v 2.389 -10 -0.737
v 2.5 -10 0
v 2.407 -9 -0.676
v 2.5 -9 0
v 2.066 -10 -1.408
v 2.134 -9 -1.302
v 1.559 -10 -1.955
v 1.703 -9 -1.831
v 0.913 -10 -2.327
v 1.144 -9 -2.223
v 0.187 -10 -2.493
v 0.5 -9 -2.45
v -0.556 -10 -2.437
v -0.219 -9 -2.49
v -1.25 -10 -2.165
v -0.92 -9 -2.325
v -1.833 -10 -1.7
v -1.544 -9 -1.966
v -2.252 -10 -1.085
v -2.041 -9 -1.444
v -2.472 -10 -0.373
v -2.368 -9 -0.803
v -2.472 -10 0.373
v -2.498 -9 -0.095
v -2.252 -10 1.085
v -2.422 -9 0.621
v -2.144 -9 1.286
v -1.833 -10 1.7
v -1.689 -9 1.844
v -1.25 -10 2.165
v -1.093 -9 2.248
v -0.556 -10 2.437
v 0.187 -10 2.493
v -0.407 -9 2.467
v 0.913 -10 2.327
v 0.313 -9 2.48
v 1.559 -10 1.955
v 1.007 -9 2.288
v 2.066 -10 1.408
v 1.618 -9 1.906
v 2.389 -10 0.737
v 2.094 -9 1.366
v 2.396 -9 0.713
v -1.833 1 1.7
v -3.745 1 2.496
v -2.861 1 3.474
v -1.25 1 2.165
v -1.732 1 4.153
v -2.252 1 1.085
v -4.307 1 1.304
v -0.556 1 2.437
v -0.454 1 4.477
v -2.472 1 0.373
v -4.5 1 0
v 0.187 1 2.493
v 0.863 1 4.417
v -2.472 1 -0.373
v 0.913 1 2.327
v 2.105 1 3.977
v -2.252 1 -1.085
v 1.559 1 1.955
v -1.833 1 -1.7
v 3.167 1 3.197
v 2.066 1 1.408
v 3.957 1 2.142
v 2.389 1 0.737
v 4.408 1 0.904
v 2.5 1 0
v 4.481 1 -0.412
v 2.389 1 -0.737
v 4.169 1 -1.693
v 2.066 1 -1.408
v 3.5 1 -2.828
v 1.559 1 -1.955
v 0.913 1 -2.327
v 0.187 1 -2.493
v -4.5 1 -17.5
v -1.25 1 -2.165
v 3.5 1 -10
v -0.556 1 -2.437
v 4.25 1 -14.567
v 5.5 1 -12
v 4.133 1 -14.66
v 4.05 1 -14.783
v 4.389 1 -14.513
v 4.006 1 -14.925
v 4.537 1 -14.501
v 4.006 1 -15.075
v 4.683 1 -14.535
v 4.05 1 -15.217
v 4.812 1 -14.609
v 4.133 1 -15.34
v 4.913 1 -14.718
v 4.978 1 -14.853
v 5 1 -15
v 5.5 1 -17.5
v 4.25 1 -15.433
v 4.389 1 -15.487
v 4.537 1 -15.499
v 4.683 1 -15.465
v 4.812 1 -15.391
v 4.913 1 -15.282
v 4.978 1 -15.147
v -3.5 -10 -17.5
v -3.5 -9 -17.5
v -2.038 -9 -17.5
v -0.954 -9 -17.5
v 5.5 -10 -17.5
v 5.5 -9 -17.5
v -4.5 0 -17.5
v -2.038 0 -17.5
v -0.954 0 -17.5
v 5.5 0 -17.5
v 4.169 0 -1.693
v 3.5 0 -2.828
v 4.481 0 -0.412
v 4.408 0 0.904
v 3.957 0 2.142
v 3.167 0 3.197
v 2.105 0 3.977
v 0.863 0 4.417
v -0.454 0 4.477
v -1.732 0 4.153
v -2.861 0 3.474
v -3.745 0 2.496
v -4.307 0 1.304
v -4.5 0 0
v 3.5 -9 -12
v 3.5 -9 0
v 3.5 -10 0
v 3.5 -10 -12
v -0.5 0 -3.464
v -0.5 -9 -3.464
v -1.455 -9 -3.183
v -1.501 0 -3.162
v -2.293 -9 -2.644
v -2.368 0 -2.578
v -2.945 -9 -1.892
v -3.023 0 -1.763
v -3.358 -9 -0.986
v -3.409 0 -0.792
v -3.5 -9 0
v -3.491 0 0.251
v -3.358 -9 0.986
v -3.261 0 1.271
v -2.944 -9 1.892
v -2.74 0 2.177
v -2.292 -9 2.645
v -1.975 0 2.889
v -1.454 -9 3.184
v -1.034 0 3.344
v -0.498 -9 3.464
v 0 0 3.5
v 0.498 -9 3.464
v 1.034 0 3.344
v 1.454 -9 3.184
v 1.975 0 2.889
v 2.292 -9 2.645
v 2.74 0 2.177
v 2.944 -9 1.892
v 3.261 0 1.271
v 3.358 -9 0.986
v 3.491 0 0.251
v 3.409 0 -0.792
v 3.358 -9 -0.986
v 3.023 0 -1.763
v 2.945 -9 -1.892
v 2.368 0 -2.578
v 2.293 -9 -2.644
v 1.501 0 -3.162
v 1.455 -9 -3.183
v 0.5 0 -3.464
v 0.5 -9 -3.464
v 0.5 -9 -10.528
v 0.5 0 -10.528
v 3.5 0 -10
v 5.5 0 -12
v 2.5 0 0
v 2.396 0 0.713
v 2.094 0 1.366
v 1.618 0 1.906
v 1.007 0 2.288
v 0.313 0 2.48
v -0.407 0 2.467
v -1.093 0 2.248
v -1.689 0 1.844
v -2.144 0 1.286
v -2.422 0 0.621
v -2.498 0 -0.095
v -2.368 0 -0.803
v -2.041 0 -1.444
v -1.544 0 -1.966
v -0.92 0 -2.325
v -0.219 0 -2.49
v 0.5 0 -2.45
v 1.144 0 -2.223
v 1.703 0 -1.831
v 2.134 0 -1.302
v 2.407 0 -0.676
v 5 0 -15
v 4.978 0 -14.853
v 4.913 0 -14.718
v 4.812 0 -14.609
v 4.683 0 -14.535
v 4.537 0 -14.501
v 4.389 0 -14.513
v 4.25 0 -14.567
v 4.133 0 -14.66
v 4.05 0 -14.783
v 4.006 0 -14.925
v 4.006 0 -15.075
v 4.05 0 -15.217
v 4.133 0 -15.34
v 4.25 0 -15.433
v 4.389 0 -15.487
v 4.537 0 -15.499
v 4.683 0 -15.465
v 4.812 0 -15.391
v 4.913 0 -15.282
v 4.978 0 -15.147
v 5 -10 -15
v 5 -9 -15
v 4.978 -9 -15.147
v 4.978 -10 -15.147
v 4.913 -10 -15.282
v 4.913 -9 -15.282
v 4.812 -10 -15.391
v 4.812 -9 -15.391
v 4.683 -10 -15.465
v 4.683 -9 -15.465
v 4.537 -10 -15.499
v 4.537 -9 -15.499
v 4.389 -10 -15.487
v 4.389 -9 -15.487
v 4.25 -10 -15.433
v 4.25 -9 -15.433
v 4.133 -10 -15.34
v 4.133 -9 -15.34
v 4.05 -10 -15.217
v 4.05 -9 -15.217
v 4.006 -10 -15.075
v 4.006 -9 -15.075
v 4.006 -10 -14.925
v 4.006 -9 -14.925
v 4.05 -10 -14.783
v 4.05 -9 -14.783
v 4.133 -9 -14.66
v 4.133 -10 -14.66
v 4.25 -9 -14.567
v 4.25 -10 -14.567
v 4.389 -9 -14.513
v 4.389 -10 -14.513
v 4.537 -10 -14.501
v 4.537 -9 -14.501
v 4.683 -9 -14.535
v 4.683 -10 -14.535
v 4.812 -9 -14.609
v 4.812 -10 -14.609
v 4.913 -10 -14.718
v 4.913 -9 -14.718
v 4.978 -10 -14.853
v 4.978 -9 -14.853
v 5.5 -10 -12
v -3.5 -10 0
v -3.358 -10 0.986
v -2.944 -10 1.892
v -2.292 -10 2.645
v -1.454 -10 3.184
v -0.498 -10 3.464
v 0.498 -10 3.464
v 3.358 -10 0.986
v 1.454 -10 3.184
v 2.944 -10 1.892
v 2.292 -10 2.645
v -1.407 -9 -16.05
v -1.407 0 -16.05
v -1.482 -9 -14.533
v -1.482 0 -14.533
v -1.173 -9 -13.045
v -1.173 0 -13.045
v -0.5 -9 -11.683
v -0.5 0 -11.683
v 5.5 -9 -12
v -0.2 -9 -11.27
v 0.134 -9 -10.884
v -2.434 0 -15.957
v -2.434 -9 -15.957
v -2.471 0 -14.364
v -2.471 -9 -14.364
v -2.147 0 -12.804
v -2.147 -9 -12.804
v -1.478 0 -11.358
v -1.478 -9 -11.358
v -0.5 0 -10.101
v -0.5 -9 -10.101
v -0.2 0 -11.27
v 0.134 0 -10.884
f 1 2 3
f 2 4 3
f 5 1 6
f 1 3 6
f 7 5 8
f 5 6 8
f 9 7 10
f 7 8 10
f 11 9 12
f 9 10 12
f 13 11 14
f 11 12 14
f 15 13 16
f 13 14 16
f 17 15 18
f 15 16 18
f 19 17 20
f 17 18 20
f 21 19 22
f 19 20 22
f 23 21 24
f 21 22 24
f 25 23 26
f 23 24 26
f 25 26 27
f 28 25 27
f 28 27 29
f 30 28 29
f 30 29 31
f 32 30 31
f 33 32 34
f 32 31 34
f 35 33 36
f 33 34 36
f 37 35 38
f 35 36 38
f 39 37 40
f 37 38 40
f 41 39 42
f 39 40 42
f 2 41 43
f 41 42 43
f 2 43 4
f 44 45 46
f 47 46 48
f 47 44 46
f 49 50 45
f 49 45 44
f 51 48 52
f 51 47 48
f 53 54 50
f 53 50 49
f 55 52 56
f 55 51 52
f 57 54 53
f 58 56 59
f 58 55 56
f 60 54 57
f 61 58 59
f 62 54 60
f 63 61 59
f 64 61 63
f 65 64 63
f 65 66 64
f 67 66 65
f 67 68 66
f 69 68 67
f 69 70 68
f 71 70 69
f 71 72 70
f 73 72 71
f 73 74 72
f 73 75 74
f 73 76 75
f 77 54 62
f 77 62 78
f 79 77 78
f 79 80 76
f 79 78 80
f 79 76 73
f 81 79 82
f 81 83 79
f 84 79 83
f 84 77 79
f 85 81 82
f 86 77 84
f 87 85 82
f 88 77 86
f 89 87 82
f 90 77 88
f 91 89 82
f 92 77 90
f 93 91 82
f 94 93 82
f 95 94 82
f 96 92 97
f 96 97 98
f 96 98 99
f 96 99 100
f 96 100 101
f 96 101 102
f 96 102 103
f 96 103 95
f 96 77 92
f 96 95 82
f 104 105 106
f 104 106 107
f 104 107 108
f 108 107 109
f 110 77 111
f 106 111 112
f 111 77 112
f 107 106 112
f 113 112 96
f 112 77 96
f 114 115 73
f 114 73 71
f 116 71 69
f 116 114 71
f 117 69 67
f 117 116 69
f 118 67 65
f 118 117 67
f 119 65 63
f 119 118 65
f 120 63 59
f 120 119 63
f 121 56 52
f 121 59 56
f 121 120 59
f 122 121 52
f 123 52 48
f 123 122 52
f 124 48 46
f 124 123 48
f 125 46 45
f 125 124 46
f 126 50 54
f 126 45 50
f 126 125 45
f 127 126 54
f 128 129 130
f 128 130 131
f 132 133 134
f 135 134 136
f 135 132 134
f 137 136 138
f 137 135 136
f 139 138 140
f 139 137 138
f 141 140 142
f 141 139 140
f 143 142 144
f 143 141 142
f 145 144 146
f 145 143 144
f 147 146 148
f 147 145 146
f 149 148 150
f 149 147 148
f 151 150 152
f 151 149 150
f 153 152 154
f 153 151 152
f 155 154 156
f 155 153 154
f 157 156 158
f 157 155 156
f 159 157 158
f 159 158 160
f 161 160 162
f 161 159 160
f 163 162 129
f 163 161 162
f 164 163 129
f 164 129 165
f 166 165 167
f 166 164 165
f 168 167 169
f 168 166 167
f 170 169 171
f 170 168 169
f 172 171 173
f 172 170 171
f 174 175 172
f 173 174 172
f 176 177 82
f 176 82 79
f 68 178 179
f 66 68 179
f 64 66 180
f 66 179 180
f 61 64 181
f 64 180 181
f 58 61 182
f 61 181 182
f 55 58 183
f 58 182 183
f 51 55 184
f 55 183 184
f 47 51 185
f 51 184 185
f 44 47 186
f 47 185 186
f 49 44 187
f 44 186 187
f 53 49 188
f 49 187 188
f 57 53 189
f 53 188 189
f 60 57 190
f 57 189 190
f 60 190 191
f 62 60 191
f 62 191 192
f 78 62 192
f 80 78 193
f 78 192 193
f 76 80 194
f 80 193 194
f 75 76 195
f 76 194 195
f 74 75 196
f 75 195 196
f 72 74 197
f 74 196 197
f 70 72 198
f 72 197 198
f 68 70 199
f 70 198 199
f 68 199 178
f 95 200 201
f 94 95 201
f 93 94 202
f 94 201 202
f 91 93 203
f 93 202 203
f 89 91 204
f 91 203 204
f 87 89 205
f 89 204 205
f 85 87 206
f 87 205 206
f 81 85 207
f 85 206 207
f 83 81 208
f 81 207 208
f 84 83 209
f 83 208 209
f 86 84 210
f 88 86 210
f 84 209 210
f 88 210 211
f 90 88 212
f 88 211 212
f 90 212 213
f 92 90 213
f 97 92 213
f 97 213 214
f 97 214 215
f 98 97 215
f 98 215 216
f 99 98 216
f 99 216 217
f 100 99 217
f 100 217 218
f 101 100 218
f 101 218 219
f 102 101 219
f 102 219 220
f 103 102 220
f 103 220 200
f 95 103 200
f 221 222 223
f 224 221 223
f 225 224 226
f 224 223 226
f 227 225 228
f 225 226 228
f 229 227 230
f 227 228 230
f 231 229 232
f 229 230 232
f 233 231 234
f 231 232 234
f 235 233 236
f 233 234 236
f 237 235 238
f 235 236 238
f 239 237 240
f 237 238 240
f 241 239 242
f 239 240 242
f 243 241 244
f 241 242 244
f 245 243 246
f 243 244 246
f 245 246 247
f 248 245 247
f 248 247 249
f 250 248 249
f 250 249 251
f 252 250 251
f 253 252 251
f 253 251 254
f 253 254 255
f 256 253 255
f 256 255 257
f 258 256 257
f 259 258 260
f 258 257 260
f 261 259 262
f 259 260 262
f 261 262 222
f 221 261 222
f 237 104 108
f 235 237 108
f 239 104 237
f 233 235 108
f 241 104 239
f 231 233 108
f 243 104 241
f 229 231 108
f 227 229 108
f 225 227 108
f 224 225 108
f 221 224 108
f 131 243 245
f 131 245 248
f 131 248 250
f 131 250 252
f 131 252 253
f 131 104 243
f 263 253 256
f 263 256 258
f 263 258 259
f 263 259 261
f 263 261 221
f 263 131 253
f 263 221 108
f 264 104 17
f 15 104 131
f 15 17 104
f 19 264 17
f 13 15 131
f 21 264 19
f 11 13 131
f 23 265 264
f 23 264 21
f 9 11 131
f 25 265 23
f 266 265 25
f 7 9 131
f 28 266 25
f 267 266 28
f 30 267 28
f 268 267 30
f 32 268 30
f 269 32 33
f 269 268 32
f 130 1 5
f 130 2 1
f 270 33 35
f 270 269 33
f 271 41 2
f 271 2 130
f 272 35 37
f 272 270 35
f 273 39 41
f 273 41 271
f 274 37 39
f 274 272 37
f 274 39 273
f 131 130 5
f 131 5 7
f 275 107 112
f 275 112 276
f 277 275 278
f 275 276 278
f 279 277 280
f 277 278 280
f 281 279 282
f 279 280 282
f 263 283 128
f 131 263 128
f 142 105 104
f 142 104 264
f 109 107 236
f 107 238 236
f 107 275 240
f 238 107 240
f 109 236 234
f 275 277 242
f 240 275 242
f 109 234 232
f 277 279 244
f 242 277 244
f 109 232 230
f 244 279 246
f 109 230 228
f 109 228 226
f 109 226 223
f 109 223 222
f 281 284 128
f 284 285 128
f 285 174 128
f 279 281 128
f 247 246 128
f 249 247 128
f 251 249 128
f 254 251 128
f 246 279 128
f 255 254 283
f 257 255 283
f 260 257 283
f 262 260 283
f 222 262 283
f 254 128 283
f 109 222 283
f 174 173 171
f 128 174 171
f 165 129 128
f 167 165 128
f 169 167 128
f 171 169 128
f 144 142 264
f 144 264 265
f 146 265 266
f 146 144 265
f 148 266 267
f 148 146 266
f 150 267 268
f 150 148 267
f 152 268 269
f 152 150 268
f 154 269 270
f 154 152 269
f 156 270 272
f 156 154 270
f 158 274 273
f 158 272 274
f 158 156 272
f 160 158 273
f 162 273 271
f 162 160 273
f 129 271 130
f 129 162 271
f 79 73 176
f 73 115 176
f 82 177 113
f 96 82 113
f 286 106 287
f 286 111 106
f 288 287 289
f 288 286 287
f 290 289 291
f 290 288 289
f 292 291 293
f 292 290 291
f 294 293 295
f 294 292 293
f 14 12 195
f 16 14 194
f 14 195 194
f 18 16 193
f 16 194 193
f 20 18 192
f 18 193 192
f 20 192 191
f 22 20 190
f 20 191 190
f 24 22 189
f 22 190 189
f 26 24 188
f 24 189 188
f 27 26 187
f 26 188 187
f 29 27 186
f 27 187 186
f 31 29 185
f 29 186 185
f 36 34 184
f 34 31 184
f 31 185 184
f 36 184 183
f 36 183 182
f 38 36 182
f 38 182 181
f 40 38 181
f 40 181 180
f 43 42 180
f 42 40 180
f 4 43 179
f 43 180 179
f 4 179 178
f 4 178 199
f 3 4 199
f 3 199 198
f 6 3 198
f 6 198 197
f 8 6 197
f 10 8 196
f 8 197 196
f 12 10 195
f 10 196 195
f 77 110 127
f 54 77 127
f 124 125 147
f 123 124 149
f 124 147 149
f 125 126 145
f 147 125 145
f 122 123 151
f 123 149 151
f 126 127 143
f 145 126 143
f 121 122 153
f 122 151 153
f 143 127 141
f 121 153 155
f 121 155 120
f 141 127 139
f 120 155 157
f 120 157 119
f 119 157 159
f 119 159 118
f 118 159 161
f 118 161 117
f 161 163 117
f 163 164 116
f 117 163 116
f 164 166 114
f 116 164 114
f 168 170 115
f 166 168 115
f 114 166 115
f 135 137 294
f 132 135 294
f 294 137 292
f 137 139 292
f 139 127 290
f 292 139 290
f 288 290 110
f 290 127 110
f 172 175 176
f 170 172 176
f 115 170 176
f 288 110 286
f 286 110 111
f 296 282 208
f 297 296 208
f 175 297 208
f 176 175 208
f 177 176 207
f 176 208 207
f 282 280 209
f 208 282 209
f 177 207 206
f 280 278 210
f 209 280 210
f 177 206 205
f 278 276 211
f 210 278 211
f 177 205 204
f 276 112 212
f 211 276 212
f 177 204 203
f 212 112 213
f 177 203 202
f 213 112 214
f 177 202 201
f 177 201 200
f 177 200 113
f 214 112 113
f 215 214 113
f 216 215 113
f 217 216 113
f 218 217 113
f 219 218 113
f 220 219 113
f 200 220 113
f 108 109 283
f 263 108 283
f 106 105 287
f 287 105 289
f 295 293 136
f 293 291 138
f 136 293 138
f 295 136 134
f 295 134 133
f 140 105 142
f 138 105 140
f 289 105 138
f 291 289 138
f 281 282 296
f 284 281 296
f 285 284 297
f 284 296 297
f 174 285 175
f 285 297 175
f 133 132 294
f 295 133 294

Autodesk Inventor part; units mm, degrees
ref_plane "YZ Plane" through (0, 0, 0) normal (1, 0, 0) x (0, 1, 0)
ref_plane "XZ Plane" through (0, 0, 0) normal (0, 1, 0) x (-1, 0, 0)
ref_plane "XY Plane" through (0, 0, 0) normal (0, 0, 1) x (1, 0, 0)
sketch "Esquisse1" plane through (0, 0, 0) normal (0, 1, 0) x (-1, 0, 0)
  arc A0 (-0.5, -2.4495) -> (0.5, -2.4495) centre (0, 0) ccw
  arc A1 (0.5, -3.4641) -> (-0.5, -3.4641) centre (0, 0) ccw
  arc A2 (0.5, -11.6834) -> (-0.5, -10.5279) centre (-4.5, -15) ccw
  arc A3 (0.5, -10.101) -> (-0.5, -9.2554) centre (-4.5, -15) ccw
  line L0 (-11.5, 3.5) -> (3.5, 3.5)
  line L1 (3.5, 3.5) -> (3.5, -17.5)
  line L2 (3.5, -17.5) -> (2.0383, -17.5)
  line L3 (-11.5, -17.5) -> (-11.5, 3.5)
  line L4 (-0.5, 0) -> (0.5, 0)
  line L5 (0.5, 0) -> (0.5, -2.4495)
  line L6 (0.5, -15) -> (-0.5, -15)
  line L7 (-0.5, -15) -> (-0.5, -10.5279)
  line L8 (0.5, -10.101) -> (0.5, -15)
  line L9 (-0.5, -9.2554) -> (-0.5, -3.4641)
  arc A4 (2.0383, -17.5) -> (0.5, -10.101) centre (-4.5, -15) ccw
  arc A5 (0.9544, -17.5) -> (0.5, -11.6834) centre (-4.5, -15) ccw
  line L10 (2.0383, -17.5) -> (0.9544, -17.5)
  line L11 (0.9544, -17.5) -> (-11.5, -17.5)
  arc A6 (-0.5, -10.5279) -> (0.9544, -17.5) centre (-4.5, -15) ccw
  arc A7 (-0.5, -9.2554) -> (2.0383, -17.5) centre (-4.5, -15) ccw
  line L12 (-0.5, -10.5279) -> (-0.5, -9.2554)
  arc A8 (0.5, -2.4495) -> (-0.5, -2.4495) centre (0, 0) ccw
  arc A9 (-0.5, -3.4641) -> (0.5, -3.4641) centre (0, 0) ccw
  line L13 (-0.5, -3.4641) -> (-0.5, -2.4495)
  line L14 (0.5, -2.4495) -> (0.5, -3.4641)
  line L15 (0.5, -3.4641) -> (0.5, -10.101)
  line L16 (-0.5, -2.4495) -> (-0.5, 0)
  dimension "d0" = 5
  dimension "d1" = 1
  dimension "d2" = 14
  dimension "d3" = 1
  dimension "d4" = 15
  dimension "d6" = 8
  dimension "d7" = 21
  dimension "d9" = 1
  dimension "d10" = 0.5
extrude "Extrusion1" add sketch "Esquisse1" against normal blind 9 contours L13 A1 L14 A8 | A9 L15 A3 L9 | A3 L8 A2 L12 | A4 L10 A5 L8
sketch "Esquisse2" plane through (0, 0, 0) normal (0, 1, 0) x (1, 0, 0)
  line L0 (0.5, 3.4641) -> (0.5, 2.4495) projected
  arc A0 (-0.5, 2.4495) -> (0.5, 2.4495) centre (0, 0) ccw projected
  line L1 (-0.5, 2.4495) -> (-0.5, 3.4641) projected
  arc A1 (-0.5, 2.4495) -> (0.5, 2.4495) centre (0, 0) ccw
  arc A2 (-0.5, 3.4641) -> (0.5, 3.4641) centre (0, 0) ccw
  arc A3 (0.5, 2.4495) -> (-0.5, 2.4495) centre (0, 0) ccw
  arc A4 (0.5, 3.4641) -> (-0.5, 3.4641) centre (0, 0) ccw
extrude "Extrusion2" add sketch "Esquisse2" against normal blind 9 contours L0 A3 L1 A4
sketch "Esquisse3" plane through (0, 0, 0) normal (0, 1, 0) x (1, 0, 0)
  circle A0 centre (0, 0) radius 2.5 projected
  arc A1 (-0.9544, 17.5) -> (0.5, 10.5279) centre (4.5, 15) ccw projected
  line L0 (-0.9544, 17.5) -> (-2.0383, 17.5) projected
  arc A2 (-0.5, 3.4641) -> (0.5, 3.4641) centre (0, 0) ccw projected
  line L1 (5.5, 17.5) -> (-4.5, 17.5)
  line L2 (-4.5, 17.5) -> (-4.5, 12)
  line L3 (-4.5, 12) -> (5.5, 12)
  line L4 (5.5, 12) -> (5.5, 17.5)
  arc A3 (3.5, 2.8284) -> (-4.5, 0) centre (0, 0) ccw
  line L5 (-4.5, 0) -> (-2.5, 0)
  line L6 (3.5, 0) -> (3.5, 2.8284)
  line L7 (3.5, 12) -> (-4.5, 12)
  line L8 (-4.5, 12) -> (-4.5, 0)
  line L9 (5.5, 12) -> (3.5, 10)
  line L10 (3.5, 2.8284) -> (3.5, 12)
  arc A4 (-4.5, 0) -> (3.5, 2.8284) centre (0, 0) ccw
  arc A5 (2.5, 0) -> (-2.5, 0) centre (0, 0) ccw
  line L11 (2.5, 0) -> (3.5, 0)
  line L12 (-2.5, 0) -> (2.5, 0)
  arc A6 (-2.5, 0) -> (2.5, 0) centre (0, 0) ccw
  dimension "d15" = 1
  dimension "d16" = 3
  dimension "d18" = 1
  dimension "d19" = 8
  dimension "d20" = 135
extrude "Extrusion3" add sketch "Esquisse3" along normal blind 1 contours L11 A2 L5 A0 | A0 L5 A3 L6 L11 | L6 A4 L5 A2 | A3 L8 L3 L10 | L10 L3 L9 | L2 L1 L0 A1 L3 | L3 A1 L1 L4
sketch "Esquisse4" plane through (0, -9, 0) normal (0, -1, 0) x (1, 0, 0)
  arc A0 (0.5, -3.4641) -> (-0.5, -3.4641) centre (0, 0) ccw projected
  line L0 (-0.5, -3.4641) -> (-0.5, -10.101) projected
  line L1 (-2.0383, -17.5) -> (-0.9544, -17.5) projected
  line L2 (0.5, -10.5279) -> (0.5, -3.4641) projected
  circle A1 centre (0, 0) radius 2.5 projected
  line L3 (-3.5, 0) -> (-2.5, 0)
  line L4 (3.5, 0) -> (3.5, -10)
  line L5 (3.5, -17.5) -> (-3.5, -17.5)
  line L6 (-3.5, -17.5) -> (-3.5, 0)
  arc A2 (3.5, 0) -> (-3.5, 0) centre (0, 0) ccw
  arc A3 (-2.5, 0) -> (2.5, 0) centre (0, 0) ccw
  line L7 (3.5, -17.5) -> (5.5, -17.5)
  line L8 (5.5, -17.5) -> (5.5, -12)
  line L9 (5.5, -12) -> (3.5, -12)
  line L10 (3.5, -12) -> (3.5, -17.5)
  line L11 (5.5, -12) -> (3.5, -12)
  line L12 (3.5, -12) -> (3.5, -10)
  line L13 (3.5, -10) -> (5.5, -10)
  line L14 (5.5, -10) -> (5.5, -12)
  arc A4 (0.5, -3.4641) -> (3.5, 0) centre (0, 0) ccw
  arc A5 (-0.5, -3.4641) -> (0.5, -3.4641) centre (0, 0) ccw
  arc A6 (-3.5, 0) -> (-0.5, -3.4641) centre (0, 0) ccw
  arc A7 (2.5, 0) -> (-2.5, 0) centre (0, 0) ccw
  line L15 (2.5, 0) -> (3.5, 0)
  line L16 (-2.5, 0) -> (2.5, 0)
  line L17 (3.5, -10) -> (3.5, -12)
  line L18 (3.5, -12) -> (3.5, -17.5)
  line L19 (3.5, -10) -> (5.5, -12)
extrude "Extrusion4" add sketch "Esquisse4" along normal blind 1 contours A5 A0 L3 A1 L15 | A0 L4 L12 L10 L5 L1 L6 A5 | L15 A1 L3 A0 | L9 L8 L7 L10
sketch "Esquisse5" plane through (0, 0, 0) normal (0, -1, 0) x (1, 0, 0)
  arc A0 (-0.5, -10.101) -> (-2.0383, -17.5) centre (4.5, -15) ccw projected
  circle A1 centre (4.5, -15) radius 0.5
  dimension "d25" = 1
extrude "Extrusion5" cut sketch "Esquisse5" along normal through all both and the other way through all
properties part number "tendeur"
